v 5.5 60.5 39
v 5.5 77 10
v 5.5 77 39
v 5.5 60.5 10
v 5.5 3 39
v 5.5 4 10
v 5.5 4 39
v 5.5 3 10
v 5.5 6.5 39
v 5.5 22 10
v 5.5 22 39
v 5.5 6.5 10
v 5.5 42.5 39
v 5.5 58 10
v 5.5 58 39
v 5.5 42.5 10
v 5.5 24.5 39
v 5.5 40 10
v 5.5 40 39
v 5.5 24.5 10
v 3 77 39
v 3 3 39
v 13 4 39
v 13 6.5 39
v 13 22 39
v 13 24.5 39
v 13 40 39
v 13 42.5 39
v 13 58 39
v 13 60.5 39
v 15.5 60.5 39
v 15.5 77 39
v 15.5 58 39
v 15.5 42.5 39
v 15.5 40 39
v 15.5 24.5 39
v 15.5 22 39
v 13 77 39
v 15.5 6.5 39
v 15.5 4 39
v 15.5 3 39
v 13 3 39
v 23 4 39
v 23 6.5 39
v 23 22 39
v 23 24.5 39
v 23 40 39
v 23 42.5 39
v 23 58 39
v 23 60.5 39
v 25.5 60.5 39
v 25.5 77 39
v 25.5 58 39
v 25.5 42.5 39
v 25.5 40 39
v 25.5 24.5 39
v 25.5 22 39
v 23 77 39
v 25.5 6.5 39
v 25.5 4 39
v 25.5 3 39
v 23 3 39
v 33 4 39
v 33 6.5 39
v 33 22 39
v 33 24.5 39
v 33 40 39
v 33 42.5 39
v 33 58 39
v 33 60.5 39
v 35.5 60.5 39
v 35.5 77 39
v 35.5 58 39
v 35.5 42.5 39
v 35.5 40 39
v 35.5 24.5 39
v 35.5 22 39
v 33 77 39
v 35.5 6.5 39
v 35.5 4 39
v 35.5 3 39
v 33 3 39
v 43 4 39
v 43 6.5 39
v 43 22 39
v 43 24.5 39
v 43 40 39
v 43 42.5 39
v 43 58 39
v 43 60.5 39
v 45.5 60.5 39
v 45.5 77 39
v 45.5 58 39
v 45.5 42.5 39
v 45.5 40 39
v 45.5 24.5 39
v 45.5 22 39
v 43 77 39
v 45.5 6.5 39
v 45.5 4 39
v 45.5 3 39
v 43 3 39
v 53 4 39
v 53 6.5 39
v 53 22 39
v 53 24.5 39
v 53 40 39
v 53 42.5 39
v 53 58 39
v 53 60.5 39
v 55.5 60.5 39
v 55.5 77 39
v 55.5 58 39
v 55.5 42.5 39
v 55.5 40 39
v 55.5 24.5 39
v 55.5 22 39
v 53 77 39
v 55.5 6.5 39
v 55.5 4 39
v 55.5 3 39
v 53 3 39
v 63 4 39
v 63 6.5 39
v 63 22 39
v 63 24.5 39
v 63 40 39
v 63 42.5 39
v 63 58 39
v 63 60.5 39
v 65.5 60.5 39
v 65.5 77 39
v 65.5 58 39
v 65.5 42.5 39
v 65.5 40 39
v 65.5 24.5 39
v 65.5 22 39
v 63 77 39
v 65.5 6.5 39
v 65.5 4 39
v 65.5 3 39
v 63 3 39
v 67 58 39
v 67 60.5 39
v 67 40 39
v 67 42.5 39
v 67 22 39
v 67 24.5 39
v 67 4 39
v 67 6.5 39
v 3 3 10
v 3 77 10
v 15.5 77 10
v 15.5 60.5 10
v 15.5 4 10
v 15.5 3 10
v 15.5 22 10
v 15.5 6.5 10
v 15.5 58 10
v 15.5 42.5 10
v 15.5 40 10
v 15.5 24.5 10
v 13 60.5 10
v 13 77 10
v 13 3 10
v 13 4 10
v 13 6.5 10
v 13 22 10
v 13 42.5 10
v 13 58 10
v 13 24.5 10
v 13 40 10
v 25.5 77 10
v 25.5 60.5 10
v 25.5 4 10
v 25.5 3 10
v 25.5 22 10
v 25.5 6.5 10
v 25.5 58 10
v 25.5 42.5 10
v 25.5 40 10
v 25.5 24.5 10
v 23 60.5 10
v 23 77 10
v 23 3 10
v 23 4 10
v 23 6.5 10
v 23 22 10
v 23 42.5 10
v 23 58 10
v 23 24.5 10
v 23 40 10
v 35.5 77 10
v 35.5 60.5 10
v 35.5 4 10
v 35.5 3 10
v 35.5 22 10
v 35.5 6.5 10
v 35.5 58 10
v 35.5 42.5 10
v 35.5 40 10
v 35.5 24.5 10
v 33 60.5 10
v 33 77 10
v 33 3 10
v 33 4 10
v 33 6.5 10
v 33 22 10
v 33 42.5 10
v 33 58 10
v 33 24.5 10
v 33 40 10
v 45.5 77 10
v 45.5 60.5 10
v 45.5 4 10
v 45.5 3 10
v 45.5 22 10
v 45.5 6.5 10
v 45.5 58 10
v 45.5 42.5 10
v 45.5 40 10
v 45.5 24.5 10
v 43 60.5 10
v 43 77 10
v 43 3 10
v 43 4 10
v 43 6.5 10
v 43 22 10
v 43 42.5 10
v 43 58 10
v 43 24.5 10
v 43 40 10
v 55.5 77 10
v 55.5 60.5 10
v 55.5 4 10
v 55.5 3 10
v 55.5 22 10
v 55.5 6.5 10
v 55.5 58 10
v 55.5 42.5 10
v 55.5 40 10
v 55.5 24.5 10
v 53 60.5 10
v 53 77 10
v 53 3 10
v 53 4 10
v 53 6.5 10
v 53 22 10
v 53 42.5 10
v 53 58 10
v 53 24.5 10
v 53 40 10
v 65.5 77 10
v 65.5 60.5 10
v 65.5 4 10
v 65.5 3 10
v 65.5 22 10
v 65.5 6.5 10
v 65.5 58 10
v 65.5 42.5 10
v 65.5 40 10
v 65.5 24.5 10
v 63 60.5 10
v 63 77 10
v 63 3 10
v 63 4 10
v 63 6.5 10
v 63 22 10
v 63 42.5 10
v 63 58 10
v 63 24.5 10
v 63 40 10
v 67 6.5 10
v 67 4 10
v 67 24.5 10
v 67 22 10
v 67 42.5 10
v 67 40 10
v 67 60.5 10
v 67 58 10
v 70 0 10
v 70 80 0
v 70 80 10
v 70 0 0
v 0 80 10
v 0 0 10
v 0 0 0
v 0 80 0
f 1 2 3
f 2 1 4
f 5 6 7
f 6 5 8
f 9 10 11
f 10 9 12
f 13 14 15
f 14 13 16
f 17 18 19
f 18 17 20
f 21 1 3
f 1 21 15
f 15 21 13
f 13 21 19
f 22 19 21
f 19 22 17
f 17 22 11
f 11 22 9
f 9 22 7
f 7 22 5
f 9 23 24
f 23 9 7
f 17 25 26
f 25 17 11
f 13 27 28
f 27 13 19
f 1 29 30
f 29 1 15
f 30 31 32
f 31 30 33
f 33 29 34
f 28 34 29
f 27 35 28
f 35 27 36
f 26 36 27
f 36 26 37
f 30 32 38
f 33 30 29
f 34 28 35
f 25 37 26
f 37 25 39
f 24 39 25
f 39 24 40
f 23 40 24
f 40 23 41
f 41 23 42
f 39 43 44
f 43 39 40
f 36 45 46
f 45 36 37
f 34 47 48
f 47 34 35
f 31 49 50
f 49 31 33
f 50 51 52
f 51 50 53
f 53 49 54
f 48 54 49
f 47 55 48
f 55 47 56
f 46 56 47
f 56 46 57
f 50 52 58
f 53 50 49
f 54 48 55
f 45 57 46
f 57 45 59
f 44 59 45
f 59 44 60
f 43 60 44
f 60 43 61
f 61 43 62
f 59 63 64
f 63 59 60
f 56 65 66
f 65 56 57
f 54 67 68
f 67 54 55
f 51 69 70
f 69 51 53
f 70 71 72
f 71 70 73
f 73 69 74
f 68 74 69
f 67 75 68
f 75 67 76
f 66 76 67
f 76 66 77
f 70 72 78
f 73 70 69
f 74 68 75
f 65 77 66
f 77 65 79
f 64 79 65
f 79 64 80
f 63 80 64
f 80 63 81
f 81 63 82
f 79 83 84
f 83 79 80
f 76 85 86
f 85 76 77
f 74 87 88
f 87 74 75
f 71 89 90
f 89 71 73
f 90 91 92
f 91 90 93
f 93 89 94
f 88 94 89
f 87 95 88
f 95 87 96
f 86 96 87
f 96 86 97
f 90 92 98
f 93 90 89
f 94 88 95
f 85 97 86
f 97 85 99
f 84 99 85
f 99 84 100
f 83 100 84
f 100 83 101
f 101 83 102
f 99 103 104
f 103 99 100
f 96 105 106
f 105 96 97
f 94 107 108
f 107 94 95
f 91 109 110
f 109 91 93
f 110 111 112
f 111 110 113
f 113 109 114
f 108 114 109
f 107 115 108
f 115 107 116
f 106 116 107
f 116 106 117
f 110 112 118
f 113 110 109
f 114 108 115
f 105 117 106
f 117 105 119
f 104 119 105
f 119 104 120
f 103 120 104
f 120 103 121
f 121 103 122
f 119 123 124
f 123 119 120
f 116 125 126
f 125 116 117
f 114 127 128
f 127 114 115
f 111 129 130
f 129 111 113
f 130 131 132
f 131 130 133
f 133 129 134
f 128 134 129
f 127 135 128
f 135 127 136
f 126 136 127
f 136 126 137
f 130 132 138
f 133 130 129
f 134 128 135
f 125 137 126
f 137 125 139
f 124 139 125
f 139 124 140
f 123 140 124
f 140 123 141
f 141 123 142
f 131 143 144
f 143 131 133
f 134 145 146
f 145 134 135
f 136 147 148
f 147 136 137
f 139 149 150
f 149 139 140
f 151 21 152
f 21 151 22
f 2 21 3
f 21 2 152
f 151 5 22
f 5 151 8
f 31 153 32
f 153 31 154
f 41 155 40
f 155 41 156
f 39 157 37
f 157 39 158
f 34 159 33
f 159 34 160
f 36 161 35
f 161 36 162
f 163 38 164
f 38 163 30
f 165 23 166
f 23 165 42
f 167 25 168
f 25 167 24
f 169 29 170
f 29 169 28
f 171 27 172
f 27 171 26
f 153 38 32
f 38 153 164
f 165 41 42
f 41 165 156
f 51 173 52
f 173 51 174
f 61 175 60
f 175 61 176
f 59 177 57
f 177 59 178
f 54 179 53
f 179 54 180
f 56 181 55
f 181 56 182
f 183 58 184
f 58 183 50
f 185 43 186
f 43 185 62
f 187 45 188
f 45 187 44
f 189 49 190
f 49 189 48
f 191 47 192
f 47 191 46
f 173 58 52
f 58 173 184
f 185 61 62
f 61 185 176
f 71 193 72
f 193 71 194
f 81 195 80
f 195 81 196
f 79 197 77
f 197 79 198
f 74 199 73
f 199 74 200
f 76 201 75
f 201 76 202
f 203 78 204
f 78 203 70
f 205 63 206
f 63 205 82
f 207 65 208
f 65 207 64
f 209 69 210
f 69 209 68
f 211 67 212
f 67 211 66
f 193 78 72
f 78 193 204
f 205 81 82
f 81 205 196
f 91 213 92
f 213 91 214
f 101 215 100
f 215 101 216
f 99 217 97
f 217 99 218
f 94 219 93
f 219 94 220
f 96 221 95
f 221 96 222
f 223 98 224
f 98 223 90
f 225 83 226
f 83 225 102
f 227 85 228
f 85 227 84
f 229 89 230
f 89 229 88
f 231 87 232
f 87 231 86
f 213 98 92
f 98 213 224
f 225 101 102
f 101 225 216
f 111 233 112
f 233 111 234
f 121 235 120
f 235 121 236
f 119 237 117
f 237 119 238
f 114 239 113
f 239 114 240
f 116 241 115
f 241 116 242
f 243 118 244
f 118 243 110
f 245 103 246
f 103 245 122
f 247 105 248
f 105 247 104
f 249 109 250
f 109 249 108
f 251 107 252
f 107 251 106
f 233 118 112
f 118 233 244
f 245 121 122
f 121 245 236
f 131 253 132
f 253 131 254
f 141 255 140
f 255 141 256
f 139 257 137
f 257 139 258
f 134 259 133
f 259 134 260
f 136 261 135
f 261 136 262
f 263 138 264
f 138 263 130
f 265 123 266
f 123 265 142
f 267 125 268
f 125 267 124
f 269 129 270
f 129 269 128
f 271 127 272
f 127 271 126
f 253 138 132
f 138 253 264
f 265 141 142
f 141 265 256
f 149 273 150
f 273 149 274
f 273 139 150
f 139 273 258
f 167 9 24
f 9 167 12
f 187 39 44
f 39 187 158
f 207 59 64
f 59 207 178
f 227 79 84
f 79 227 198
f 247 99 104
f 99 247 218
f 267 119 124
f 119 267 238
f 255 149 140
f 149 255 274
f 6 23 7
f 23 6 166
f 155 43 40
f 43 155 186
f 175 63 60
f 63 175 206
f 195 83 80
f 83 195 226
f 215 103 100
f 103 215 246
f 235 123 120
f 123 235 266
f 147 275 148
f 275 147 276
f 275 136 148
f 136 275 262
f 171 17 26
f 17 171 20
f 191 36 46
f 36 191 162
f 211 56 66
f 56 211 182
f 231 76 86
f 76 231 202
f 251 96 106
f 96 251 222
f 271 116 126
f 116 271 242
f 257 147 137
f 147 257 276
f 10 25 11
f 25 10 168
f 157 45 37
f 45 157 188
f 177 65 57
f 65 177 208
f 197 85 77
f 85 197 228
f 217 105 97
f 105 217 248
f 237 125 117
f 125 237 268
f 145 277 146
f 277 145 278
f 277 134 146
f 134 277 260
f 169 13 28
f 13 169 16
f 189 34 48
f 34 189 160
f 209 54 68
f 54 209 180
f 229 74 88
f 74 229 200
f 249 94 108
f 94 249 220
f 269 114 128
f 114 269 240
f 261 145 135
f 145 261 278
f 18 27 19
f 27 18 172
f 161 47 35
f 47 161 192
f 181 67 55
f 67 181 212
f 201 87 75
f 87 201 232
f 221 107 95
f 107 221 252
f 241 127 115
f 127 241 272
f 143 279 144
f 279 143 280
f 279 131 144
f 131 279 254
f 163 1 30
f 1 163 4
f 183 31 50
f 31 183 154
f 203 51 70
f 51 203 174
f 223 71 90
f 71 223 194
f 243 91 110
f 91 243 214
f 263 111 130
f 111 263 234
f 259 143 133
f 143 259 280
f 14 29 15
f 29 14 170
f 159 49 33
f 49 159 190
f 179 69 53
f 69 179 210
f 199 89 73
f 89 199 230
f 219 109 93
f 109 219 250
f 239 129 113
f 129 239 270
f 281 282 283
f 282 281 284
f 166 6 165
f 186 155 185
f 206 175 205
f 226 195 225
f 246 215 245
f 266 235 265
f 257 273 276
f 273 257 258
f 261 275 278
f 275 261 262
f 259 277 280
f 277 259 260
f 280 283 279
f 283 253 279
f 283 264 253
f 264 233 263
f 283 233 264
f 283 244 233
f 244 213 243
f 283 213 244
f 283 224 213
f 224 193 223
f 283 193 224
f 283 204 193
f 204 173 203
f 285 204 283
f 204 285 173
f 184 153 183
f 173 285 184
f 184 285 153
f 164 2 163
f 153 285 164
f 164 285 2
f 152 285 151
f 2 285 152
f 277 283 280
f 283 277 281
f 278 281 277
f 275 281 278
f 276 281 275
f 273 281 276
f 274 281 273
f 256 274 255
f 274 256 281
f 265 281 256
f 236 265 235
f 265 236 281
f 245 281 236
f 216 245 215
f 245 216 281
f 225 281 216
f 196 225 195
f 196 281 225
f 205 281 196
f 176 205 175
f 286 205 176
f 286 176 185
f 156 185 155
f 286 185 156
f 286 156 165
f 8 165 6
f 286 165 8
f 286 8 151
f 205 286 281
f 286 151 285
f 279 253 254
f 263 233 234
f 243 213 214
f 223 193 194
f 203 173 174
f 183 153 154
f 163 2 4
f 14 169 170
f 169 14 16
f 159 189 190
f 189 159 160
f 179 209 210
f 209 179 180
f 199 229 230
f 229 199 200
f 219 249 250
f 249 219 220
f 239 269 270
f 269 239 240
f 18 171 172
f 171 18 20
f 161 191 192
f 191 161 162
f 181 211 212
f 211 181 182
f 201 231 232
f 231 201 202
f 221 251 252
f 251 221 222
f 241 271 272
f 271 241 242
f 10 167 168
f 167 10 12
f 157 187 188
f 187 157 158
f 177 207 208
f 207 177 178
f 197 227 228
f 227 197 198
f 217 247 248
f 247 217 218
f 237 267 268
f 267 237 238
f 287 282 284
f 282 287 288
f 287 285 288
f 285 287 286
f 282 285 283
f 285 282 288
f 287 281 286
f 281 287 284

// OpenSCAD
$fn = 32;

// ----------------------------------------------------------------------
// Heatsink: cross fin block
// ----------------------------------------------------------------------

// --- parameters (mm) ---
base_l = 70;              // base length, X
base_w = 80;              // base width, Y
base_t = 10;              // base plate thickness
fin_h = 30;               // fin height above the base
fin_t = 2.5;              // fin thickness
edge = 3;                 // margin from the base ends
pitch = 10;               // fin pitch
rib_pitch = 18;           // cross rib pitch

n_fins = floor((base_l - 2 * edge - fin_t) / pitch) + 1;  // fin count
total_h = base_t + fin_h - 1;  // overall height
n_ribs = floor((base_w - 2 * edge) / rib_pitch);  // rib count

union() {
  cube([base_l, base_w, base_t]);
  for (i = [0 : n_fins - 1])
    translate([edge + i * pitch, edge, base_t - 1])
      cube([fin_t, base_w - 2 * edge, fin_h]);
  for (i = [0 : n_ribs - 1])
    translate([edge, edge + 1 + i * rib_pitch, base_t - 1])
      cube([base_l - 2 * edge, fin_t, fin_h]);
}
